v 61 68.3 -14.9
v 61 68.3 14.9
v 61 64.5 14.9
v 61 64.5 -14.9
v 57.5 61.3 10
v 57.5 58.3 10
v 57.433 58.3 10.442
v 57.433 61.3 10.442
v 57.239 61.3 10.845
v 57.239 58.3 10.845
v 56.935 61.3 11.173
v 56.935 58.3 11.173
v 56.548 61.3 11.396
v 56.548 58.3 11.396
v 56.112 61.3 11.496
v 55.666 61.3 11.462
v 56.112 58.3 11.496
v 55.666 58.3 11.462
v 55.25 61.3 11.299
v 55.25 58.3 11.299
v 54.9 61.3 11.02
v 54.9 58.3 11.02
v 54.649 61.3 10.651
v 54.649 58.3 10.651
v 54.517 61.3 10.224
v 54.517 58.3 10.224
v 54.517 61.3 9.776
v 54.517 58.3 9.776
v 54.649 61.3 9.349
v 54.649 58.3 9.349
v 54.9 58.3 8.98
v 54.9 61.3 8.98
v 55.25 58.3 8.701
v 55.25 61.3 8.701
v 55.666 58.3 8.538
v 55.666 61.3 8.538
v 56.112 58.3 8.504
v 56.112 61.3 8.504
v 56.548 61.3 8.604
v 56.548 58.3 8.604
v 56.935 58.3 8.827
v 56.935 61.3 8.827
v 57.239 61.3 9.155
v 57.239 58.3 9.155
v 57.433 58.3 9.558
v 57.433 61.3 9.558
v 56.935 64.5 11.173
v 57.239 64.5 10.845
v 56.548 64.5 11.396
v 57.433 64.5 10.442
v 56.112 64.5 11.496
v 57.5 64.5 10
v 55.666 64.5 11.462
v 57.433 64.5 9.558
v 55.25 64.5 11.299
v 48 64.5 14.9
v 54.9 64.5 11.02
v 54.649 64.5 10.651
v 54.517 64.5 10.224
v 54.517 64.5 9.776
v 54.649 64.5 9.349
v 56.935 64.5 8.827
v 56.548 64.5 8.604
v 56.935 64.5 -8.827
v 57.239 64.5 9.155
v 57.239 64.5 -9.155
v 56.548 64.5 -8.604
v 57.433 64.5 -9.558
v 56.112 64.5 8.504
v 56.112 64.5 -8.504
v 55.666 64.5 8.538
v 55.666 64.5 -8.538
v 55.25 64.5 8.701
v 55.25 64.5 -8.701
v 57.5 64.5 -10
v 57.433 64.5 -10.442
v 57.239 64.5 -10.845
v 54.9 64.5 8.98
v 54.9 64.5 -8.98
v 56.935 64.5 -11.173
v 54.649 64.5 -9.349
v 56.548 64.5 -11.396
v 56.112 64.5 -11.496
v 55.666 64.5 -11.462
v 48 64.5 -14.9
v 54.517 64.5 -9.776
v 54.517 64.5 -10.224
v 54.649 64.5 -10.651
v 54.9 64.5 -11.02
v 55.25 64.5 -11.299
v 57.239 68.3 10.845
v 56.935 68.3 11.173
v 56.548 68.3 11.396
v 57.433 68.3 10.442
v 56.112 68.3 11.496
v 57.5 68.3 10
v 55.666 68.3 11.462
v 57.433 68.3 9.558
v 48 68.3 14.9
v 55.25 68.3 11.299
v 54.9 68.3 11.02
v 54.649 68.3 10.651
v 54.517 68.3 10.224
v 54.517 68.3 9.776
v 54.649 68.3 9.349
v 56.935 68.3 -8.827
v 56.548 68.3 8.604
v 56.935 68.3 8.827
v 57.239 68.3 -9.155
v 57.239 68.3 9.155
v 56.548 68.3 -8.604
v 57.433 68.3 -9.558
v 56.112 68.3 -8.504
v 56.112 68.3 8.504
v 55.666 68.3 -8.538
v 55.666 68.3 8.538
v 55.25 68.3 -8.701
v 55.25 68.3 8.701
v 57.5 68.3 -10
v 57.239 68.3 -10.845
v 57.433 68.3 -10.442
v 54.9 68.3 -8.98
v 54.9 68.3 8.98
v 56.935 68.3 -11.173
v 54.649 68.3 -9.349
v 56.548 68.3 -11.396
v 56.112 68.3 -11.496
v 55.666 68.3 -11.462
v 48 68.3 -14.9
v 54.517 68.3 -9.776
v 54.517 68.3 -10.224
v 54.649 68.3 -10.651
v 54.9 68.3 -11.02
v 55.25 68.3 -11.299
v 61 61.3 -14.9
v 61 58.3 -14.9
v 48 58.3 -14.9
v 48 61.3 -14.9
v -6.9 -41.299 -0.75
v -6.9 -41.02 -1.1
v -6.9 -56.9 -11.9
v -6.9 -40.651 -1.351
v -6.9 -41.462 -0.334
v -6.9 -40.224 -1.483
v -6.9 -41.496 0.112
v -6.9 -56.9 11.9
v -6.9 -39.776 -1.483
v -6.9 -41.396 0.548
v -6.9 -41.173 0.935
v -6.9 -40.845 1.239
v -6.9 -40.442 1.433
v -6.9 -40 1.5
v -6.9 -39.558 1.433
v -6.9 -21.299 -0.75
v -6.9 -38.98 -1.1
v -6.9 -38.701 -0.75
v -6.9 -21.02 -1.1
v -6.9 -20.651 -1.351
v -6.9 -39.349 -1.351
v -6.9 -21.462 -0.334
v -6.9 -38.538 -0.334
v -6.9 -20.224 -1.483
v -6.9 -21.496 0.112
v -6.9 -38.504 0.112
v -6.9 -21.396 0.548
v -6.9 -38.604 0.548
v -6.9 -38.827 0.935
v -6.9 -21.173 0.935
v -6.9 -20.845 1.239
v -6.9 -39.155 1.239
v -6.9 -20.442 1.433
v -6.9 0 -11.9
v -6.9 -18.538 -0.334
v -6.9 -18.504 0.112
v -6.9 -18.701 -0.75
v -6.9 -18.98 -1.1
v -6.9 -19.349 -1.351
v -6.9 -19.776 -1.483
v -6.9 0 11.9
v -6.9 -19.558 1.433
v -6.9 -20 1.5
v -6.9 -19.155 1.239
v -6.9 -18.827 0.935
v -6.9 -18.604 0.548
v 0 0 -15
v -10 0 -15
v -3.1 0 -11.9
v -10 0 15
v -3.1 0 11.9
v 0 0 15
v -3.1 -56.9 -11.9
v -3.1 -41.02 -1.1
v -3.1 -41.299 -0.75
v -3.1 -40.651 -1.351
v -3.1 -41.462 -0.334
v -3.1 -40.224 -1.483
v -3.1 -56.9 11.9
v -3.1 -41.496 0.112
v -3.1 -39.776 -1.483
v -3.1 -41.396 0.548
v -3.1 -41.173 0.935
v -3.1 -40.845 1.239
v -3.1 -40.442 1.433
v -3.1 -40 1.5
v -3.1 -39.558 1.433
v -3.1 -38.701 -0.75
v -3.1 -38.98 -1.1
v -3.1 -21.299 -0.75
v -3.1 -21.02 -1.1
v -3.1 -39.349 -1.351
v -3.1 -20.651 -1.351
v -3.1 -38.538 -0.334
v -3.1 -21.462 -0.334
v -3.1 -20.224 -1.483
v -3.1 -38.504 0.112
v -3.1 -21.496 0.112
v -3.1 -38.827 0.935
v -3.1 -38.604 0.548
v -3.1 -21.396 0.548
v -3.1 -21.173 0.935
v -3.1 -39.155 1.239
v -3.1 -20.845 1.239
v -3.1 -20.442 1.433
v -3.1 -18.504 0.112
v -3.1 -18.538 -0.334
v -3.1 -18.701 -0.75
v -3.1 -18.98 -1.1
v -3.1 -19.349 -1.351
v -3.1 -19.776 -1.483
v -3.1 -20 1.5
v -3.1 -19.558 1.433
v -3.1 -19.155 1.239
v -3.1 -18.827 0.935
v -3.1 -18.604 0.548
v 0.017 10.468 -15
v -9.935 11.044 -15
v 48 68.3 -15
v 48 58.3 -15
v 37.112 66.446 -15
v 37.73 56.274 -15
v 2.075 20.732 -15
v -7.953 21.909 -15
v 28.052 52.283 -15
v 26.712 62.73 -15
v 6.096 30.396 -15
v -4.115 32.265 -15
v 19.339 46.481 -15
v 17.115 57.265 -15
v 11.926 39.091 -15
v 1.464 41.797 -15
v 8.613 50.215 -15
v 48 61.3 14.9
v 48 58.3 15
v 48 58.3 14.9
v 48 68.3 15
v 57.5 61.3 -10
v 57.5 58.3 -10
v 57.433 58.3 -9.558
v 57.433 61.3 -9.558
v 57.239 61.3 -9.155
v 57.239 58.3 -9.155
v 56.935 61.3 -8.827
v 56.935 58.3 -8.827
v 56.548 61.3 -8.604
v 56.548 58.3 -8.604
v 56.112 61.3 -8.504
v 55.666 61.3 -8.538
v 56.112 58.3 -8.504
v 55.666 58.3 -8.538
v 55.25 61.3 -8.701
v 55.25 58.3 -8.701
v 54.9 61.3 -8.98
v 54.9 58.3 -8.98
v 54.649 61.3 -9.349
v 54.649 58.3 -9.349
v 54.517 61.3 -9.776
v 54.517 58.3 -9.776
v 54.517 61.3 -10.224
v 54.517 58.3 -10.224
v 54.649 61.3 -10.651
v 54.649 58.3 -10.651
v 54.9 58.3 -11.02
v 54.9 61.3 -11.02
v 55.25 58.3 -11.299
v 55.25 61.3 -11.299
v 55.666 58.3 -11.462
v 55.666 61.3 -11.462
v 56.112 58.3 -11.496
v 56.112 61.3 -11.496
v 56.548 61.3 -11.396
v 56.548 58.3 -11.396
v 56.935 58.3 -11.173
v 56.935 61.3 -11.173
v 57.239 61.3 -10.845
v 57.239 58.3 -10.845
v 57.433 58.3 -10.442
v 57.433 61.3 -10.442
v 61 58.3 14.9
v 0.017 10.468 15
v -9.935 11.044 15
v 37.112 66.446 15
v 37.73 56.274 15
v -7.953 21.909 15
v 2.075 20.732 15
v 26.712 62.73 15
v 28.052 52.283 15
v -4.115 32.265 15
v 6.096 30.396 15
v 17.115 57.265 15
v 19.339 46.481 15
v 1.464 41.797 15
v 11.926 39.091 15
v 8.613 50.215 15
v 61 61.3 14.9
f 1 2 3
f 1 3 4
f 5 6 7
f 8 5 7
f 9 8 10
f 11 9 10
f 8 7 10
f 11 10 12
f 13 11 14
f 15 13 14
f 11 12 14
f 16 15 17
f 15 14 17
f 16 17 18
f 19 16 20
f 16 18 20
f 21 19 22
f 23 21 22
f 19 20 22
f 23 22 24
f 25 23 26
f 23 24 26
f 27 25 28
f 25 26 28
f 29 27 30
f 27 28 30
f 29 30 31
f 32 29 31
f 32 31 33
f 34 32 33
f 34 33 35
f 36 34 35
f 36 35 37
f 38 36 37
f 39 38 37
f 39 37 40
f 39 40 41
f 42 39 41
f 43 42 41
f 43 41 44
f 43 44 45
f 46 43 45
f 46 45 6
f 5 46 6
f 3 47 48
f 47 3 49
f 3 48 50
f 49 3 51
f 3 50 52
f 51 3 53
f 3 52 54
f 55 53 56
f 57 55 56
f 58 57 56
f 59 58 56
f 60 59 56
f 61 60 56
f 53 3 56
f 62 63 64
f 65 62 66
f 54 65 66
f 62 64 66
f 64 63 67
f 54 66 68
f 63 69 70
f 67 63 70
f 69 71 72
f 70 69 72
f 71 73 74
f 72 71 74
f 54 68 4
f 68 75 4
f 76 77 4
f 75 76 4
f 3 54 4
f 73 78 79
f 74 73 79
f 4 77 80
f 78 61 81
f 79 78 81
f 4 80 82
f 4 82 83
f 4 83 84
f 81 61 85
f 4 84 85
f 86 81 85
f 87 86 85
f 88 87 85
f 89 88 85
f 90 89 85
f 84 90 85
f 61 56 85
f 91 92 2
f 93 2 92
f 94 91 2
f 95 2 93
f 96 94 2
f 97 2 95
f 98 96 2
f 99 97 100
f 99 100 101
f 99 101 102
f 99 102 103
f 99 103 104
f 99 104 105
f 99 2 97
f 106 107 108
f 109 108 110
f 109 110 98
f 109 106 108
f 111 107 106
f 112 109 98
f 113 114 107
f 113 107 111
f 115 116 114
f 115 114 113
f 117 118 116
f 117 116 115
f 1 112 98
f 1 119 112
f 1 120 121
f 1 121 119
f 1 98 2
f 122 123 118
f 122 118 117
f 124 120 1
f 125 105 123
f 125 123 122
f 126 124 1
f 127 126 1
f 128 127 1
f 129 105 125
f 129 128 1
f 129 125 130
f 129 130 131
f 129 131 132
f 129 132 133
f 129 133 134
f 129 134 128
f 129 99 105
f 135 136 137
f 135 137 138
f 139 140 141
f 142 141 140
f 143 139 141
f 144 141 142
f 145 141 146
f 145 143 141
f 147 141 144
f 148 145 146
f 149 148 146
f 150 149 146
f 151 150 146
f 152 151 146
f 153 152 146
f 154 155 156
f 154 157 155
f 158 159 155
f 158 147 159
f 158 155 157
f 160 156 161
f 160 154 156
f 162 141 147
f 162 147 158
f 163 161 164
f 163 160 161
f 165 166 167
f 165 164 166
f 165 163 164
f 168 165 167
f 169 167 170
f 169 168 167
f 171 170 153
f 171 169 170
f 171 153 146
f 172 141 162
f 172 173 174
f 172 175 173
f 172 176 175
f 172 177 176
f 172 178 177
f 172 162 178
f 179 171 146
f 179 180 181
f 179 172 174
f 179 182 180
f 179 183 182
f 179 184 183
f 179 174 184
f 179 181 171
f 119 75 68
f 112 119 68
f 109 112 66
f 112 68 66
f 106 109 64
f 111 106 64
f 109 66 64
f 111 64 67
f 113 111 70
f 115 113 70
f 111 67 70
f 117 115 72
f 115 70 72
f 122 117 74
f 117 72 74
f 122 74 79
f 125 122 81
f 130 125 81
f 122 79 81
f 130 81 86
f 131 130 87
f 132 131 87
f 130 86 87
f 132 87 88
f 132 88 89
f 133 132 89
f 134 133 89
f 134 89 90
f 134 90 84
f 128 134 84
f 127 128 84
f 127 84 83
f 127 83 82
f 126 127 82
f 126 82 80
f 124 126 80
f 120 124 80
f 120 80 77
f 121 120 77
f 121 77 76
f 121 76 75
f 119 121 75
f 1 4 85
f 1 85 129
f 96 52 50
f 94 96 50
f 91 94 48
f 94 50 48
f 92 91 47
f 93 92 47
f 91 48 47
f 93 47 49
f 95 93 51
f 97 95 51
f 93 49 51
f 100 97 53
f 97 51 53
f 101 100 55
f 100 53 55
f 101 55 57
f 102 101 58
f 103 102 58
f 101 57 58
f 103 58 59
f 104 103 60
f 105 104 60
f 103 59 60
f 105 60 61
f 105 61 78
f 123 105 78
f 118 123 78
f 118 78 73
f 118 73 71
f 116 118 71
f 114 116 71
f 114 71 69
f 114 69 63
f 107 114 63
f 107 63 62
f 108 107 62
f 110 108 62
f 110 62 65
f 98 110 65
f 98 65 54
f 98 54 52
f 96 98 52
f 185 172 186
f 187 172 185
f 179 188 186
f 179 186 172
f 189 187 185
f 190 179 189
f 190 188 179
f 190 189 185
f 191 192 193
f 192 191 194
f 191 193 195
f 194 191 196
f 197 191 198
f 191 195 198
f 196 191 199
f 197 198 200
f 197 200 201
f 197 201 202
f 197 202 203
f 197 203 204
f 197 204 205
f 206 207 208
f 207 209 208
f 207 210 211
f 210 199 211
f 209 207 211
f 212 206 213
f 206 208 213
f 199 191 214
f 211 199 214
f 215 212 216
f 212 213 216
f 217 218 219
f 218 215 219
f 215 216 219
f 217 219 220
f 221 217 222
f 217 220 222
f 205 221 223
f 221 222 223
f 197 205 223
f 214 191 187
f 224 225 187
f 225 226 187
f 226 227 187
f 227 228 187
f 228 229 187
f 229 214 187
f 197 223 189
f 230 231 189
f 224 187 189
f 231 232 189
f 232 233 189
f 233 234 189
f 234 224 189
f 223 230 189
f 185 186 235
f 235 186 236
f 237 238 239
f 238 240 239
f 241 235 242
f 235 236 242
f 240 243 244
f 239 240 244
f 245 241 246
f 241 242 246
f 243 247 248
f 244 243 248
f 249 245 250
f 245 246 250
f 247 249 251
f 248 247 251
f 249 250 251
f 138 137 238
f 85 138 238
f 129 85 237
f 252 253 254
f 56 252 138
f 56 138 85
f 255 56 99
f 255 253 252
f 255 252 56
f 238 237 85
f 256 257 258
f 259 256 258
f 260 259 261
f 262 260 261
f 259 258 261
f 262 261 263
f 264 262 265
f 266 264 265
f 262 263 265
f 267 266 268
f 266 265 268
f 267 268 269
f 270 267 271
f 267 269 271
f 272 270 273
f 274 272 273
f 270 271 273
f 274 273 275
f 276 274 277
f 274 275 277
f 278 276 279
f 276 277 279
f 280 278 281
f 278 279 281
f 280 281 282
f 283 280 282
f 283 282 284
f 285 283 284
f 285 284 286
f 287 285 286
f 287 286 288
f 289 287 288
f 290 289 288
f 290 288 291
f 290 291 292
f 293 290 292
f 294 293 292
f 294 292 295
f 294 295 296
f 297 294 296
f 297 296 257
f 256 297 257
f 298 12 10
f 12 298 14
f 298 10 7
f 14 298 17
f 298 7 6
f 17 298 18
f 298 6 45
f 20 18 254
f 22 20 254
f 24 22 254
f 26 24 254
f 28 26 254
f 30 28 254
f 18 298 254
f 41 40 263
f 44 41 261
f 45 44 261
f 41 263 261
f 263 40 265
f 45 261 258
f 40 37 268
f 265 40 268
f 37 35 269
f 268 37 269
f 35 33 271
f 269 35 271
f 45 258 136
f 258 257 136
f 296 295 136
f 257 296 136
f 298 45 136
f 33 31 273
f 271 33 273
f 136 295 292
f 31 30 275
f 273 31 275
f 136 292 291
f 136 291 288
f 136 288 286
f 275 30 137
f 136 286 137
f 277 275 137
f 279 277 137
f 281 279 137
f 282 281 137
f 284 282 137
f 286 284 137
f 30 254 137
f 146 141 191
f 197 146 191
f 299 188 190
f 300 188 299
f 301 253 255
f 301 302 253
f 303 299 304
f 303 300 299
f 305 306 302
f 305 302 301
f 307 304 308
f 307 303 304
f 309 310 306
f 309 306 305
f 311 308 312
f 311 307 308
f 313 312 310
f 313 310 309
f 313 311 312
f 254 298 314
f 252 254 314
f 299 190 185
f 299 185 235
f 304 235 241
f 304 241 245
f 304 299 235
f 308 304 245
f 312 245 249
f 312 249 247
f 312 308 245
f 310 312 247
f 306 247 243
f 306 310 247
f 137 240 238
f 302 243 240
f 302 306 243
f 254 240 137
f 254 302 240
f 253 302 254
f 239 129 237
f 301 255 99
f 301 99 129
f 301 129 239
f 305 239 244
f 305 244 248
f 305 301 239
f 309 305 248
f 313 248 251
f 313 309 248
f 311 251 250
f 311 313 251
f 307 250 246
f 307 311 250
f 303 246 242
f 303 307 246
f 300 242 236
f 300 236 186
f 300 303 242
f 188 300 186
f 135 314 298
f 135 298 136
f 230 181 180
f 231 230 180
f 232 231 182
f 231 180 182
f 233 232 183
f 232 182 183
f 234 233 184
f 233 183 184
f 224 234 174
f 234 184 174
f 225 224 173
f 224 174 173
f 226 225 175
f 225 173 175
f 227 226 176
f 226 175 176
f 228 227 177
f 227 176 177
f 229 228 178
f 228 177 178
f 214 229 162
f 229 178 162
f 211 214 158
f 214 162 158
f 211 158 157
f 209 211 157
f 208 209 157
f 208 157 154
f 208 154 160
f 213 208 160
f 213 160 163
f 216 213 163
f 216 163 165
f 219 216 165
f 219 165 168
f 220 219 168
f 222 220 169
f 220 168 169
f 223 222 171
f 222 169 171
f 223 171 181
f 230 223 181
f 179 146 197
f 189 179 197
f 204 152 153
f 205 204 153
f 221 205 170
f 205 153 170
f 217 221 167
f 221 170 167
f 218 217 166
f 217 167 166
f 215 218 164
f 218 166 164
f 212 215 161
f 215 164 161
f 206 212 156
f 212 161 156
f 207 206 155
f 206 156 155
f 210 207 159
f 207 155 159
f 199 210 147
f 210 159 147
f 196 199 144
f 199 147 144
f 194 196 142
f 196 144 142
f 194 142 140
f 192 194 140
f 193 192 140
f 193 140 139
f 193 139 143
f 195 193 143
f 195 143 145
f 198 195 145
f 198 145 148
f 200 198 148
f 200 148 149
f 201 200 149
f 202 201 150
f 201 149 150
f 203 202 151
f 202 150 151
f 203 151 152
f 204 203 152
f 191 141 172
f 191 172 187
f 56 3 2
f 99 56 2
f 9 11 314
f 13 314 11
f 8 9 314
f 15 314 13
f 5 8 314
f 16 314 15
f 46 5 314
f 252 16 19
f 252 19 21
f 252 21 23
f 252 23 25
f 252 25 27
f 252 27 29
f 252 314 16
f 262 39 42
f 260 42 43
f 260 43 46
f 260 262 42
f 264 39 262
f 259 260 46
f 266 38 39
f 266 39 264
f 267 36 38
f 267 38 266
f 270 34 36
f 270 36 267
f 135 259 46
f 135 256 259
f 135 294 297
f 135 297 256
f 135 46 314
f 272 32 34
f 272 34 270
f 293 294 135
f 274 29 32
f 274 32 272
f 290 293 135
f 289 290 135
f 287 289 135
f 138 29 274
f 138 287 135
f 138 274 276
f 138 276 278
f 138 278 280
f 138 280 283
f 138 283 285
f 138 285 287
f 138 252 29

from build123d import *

# Parameters (mm, degrees)
BOSS_EXTRUDE1_DEPTH = 15
SKETCH2_W           = 3.8
SKETCH2_H           = 23.8
BOSS_EXTRUDE2_DEPTH = 56.9
SKETCH3_R           = 1.5
CUT_EXTRUDE1_DEPTH  = 3.8
SKETCH4_W           = 30
SKETCH4_H           = 3.8
SKETCH4_H_2         = 3
BOSS_EXTRUDE3_DEPTH = 13
CUT_EXTRUDE2_REACH  = 133.214
SKETCH5_R           = 1.5
SKETCH6_W           = 0.1
SKETCH6_H           = 10
CUT_EXTRUDE3_DEPTH  = 13


with BuildPart() as part:
    # Sketch1 → Boss-Extrude1 (new, symmetric)
    with BuildSketch(Plane.XY):
        with BuildLine():
            Line((-10, 0), (0, 0))
            ThreePointArc((0, 0), (11.925674657, 39.091125497), (48, 58.3))
            Line((48, 58.3), (48, 68.3))
            ThreePointArc((48, 68.3), (4.854606845, 46.162193309), (-10, 0))
        make_face()
    extrude(amount=BOSS_EXTRUDE1_DEPTH, both=True)

    # Sketch2 → Boss-Extrude2 (add)
    with BuildSketch(Plane.XZ):
        with Locations((-5, 0)):
            Rectangle(SKETCH2_W, SKETCH2_H)
    extrude(amount=BOSS_EXTRUDE2_DEPTH)

    # Sketch3 → Cut-Extrude1 (cut)
    with BuildSketch(Plane.ZY.offset(6.9)):
        with Locations((0, -20)):
            Circle(SKETCH3_R)
        with Locations((0, -40)):
            Circle(SKETCH3_R)
    extrude(amount=-CUT_EXTRUDE1_DEPTH, mode=Mode.SUBTRACT)

    # Sketch4 → Boss-Extrude3 (add)
    with BuildSketch(Plane(origin=(48, 0, 0), x_dir=(0, 0, -1), z_dir=(1, 0, 0))):
        with Locations((0, 66.4)):
            Rectangle(SKETCH4_W, SKETCH4_H)
        with Locations((0, 59.8)):
            Rectangle(SKETCH4_W, SKETCH4_H_2)
    extrude(amount=BOSS_EXTRUDE3_DEPTH)

    # Cut-Extrude2: up to this face of the body (flat: up to its plane)
    cut_extrude2_end = Plane(part.part.faces().sort_by_distance((54.5, 68.3, 0))[0])
    # Sketch5 → Cut-Extrude2 (cut, up to the picked face)
    with BuildSketch(Plane.XZ.offset(-58.3), mode=Mode.PRIVATE) as cut_extrude2_sk1:
        with Locations((56, 10)):
            Circle(SKETCH5_R)
    cut_extrude2_tool1 = split(extrude(cut_extrude2_sk1.sketch, amount=-CUT_EXTRUDE2_REACH, mode=Mode.PRIVATE), bisect_by=cut_extrude2_end, keep=Keep.BOTH, mode=Mode.PRIVATE)
    # Sketch5 → Cut-Extrude2 (cut, up to the picked face)
    with BuildSketch(Plane.XZ.offset(-58.3), mode=Mode.PRIVATE) as cut_extrude2_sk2:
        with Locations((56, -10)):
            Circle(SKETCH5_R)
    cut_extrude2_tool2 = split(extrude(cut_extrude2_sk2.sketch, amount=-CUT_EXTRUDE2_REACH, mode=Mode.PRIVATE), bisect_by=cut_extrude2_end, keep=Keep.BOTH, mode=Mode.PRIVATE)
    add(cut_extrude2_tool1.solids().sort_by(Axis((56, 58.3, 10), (0, 1, 0)))[0], mode=Mode.SUBTRACT)
    add(cut_extrude2_tool2.solids().sort_by(Axis((56, 58.3, -10), (0, 1, 0)))[0], mode=Mode.SUBTRACT)

    # Sketch6 → Cut-Extrude3 (cut)
    with BuildSketch(Plane(origin=(61, 0, 0), x_dir=(0, 0, -1), z_dir=(1, 0, 0))):
        with Locations((-14.95, 63.3)):
            Rectangle(SKETCH6_W, SKETCH6_H)
        with Locations((14.95, 63.3)):
            Rectangle(SKETCH6_W, SKETCH6_H)
    extrude(amount=-CUT_EXTRUDE3_DEPTH, mode=Mode.SUBTRACT)


solid = part.part
